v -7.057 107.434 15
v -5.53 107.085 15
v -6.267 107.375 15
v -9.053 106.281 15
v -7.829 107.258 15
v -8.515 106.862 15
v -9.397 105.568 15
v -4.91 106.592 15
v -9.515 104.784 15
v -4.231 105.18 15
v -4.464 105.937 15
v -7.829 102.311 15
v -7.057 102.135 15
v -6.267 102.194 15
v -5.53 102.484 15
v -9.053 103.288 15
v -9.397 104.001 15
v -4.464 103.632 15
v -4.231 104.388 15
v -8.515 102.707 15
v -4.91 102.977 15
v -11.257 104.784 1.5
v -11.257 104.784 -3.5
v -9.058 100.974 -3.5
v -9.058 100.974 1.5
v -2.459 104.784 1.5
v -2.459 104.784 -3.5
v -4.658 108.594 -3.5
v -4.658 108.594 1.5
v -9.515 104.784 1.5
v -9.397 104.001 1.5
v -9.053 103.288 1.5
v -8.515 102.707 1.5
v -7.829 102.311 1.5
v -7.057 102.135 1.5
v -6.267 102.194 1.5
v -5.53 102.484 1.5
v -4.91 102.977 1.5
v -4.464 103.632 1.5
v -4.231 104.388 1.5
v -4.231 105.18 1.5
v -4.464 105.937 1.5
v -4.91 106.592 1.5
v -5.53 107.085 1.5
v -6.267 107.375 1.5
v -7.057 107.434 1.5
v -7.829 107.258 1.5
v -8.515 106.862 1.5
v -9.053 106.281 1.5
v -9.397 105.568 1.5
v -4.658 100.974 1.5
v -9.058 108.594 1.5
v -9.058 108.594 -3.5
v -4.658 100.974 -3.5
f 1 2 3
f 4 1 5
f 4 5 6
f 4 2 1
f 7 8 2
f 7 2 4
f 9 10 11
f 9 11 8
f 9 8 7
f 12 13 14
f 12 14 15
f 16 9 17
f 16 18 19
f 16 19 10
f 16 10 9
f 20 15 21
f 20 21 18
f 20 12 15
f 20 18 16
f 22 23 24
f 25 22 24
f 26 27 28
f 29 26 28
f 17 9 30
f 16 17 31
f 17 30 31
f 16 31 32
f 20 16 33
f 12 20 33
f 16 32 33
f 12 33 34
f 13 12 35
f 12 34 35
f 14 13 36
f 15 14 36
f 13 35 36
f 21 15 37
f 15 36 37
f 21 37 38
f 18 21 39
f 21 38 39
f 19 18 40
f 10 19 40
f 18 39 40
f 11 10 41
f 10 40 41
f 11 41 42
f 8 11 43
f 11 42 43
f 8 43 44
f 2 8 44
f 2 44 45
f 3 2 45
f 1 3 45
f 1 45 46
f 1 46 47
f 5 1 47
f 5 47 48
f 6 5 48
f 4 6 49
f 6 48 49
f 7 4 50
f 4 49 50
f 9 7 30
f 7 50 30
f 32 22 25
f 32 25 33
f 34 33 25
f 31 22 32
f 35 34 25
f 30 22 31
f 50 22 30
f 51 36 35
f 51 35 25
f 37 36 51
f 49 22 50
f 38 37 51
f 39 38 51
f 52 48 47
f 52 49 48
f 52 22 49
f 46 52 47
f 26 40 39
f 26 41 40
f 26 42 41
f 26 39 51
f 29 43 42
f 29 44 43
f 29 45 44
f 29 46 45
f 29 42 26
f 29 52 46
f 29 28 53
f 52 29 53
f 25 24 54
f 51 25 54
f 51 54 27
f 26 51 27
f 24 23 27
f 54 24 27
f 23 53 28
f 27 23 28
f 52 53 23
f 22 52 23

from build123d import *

# Parameters (mm, degrees)
EXTRUDE1_DEPTH      = 1.5
EXTRUDE1_DEPTH_BACK = 3.5
SKETCH2_R           = 2.656835516
EXTRUDE2_DEPTH      = 13.5


with BuildPart() as part:
    # Sketch1 → Extrude1 (new, two sides: drawn at the far end of the back side and taken through both)
    with BuildSketch(Plane.XY.offset(-EXTRUDE1_DEPTH_BACK)):
        Polygon((-2.458590949, 104.784469075), (-4.658295474, 108.594469075), (-9.057704526, 108.594469075), (-11.257409051, 104.784469075), (-9.057704526, 100.974469075), (-4.658295474, 100.974469075), align=None)
    extrude(amount=EXTRUDE1_DEPTH + EXTRUDE1_DEPTH_BACK)

    # Sketch2 → Extrude2 (add)
    with BuildSketch(Plane.XY.offset(1.5)):
        with Locations(Location((-6.858, 104.784469075, 0), (0, 0, 180))):
            Circle(SKETCH2_R)
    extrude(amount=EXTRUDE2_DEPTH)


solid = part.part
